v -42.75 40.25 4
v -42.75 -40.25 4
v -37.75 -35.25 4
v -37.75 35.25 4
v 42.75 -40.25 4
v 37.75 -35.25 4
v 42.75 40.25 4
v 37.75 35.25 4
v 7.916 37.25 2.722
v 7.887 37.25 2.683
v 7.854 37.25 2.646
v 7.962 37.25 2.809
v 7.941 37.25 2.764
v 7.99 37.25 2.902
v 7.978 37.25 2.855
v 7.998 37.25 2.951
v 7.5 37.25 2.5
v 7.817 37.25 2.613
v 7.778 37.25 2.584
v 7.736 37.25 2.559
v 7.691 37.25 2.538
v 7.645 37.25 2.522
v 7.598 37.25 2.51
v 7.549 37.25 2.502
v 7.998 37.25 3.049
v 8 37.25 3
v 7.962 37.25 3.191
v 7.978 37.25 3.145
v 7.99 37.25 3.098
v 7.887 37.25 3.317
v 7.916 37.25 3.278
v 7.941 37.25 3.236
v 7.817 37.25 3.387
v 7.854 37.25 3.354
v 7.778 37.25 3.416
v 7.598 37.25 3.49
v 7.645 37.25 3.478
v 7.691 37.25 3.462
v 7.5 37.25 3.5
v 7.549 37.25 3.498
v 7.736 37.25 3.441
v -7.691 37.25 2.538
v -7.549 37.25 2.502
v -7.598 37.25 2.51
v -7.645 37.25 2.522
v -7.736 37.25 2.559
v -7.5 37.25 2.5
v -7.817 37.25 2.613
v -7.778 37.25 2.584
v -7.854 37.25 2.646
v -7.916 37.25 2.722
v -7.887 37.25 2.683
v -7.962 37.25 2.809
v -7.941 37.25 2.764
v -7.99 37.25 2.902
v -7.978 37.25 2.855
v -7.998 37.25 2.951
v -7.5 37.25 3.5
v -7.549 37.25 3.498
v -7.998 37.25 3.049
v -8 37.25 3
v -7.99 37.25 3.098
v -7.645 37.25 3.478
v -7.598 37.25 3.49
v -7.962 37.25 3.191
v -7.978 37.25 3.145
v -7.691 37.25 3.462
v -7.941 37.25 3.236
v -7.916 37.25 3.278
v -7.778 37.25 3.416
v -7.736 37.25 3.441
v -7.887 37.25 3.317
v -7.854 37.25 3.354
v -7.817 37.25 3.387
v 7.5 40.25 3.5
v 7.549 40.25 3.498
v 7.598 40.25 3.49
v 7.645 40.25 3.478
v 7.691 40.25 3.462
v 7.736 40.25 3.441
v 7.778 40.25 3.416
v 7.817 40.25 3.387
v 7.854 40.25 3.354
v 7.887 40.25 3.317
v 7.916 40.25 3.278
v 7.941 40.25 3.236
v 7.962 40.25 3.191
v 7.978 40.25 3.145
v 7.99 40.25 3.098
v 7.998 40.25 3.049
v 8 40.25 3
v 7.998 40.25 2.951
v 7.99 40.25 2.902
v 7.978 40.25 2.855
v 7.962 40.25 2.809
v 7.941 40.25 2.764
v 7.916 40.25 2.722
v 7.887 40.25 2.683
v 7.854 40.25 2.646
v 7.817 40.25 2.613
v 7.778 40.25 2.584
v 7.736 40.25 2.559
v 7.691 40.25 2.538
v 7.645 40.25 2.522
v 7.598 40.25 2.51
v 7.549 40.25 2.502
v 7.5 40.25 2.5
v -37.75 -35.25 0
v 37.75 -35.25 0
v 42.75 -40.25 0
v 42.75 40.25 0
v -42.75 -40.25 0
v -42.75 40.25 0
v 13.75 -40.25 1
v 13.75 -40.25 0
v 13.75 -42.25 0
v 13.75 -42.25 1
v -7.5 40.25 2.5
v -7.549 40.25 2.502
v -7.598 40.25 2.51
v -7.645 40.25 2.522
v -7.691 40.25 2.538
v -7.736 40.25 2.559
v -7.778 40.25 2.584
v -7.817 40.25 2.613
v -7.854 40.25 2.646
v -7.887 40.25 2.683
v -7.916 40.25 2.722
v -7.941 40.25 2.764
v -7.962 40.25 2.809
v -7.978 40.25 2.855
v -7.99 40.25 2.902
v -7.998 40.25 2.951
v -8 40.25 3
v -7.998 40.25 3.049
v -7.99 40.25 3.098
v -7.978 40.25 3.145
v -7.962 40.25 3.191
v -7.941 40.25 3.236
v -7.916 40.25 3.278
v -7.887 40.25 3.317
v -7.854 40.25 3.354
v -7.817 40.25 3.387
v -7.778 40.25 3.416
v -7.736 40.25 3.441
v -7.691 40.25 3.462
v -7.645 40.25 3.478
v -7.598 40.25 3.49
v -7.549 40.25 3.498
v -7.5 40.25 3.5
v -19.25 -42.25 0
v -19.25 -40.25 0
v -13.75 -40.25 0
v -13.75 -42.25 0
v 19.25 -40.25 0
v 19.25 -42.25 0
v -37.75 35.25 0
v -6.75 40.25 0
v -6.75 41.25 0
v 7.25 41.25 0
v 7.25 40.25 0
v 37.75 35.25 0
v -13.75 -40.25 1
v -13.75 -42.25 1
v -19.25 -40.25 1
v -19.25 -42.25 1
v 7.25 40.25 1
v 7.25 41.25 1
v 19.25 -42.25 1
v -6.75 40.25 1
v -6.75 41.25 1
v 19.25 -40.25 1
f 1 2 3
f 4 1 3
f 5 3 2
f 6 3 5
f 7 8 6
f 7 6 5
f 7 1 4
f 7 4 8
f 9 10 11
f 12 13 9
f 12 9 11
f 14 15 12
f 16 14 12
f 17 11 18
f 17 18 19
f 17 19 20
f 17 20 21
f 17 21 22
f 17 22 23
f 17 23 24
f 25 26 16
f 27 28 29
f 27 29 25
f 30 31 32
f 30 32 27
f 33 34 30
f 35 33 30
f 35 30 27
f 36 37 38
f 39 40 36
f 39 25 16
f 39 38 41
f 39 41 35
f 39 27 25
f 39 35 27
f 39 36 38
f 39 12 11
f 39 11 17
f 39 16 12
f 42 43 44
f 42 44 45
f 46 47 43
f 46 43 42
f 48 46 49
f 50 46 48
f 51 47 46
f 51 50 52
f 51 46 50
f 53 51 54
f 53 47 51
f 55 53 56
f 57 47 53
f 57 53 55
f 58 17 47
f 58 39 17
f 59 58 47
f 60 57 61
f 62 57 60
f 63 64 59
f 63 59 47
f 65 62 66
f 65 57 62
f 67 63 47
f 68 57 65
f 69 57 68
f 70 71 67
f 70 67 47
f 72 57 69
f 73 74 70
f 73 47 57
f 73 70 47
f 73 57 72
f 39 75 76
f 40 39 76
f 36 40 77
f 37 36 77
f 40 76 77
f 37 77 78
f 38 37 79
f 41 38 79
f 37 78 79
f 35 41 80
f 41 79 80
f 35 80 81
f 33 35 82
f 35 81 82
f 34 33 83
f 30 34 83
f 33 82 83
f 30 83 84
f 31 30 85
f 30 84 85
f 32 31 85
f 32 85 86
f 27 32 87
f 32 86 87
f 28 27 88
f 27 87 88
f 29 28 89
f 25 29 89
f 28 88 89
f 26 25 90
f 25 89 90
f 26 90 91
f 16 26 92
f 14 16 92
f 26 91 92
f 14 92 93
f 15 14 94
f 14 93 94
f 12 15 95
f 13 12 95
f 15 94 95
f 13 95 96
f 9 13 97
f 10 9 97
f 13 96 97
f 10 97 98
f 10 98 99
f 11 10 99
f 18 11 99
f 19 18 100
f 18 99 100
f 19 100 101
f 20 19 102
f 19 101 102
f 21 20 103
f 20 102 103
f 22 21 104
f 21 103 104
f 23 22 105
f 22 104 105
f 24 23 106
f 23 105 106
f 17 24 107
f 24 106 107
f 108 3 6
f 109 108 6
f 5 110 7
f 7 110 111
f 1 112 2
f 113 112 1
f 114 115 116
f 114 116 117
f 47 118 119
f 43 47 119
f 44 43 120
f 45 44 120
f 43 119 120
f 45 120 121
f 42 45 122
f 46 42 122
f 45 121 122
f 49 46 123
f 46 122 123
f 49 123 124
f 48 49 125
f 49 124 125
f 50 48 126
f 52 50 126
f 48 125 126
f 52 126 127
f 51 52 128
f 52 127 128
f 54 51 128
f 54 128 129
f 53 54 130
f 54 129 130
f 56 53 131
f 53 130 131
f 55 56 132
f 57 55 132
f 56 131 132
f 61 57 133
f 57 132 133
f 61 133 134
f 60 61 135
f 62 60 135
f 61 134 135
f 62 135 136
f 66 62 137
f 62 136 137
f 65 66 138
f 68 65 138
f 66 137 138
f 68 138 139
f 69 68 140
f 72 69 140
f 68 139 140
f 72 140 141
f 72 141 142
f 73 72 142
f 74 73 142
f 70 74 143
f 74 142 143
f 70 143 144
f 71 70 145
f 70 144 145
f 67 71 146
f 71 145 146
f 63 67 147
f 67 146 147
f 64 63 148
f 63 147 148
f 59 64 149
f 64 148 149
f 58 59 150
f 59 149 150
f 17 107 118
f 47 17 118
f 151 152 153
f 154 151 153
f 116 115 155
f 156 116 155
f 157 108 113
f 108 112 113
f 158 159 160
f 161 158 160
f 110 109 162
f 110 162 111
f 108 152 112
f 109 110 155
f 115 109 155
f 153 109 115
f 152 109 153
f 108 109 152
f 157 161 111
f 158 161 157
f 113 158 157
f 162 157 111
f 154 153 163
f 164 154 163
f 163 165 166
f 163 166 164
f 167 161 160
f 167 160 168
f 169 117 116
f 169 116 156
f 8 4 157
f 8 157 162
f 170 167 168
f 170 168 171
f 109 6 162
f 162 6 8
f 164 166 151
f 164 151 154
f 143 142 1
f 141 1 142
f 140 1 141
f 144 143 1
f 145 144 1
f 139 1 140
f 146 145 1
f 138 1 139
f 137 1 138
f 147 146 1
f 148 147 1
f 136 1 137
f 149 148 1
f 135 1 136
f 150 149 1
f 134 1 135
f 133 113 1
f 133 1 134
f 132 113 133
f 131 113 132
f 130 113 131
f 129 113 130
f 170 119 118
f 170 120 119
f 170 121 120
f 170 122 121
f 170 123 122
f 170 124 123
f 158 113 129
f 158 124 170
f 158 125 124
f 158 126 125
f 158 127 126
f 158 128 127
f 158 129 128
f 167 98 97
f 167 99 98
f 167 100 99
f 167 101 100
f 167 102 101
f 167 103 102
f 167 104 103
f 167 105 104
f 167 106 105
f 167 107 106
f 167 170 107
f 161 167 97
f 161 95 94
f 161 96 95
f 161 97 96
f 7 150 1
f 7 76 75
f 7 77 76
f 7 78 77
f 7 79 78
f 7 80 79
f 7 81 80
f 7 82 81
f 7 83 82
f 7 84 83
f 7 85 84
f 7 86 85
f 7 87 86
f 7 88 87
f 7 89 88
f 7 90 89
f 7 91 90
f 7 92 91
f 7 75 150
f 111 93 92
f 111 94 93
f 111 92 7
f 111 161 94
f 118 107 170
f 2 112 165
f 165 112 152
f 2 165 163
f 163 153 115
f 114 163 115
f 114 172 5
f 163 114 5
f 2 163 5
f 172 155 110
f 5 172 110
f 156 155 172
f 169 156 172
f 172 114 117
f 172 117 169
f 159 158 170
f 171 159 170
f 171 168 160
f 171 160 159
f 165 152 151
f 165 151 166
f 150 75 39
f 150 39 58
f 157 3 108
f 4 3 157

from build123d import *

# Parameters (mm, degrees)
SKETCH006_W     = 85.5
SKETCH006_H     = 80.5
PAD_DEPTH       = 4
SKETCH007_W     = 75.5
SKETCH007_H     = 70.5
POCKET_DEPTH    = 4.001
SKETCH014_W     = 5.5
SKETCH014_H     = 1
PAD002_DEPTH    = 2
SKETCH016_W     = 14
SKETCH016_H     = 1
PAD003_DEPTH    = 1
POCKET001_DEPTH = 3


with BuildPart() as part:
    # Sketch006 → Pad (new body)
    with BuildSketch(Plane.XY):
        Rectangle(SKETCH006_W, SKETCH006_H)
    extrude(amount=PAD_DEPTH)

    # Sketch007 (on Face6 of Pad) → Pocket (cut, through all)
    with BuildSketch(Plane.XY.offset(4)):
        Rectangle(SKETCH007_W, SKETCH007_H)
    extrude(amount=-POCKET_DEPTH, mode=Mode.SUBTRACT)

    # Sketch014 (on Face6 of Pocket) → Pad002 (join)
    with BuildSketch(Plane.XZ.offset(40.25)):
        with Locations((-16.5, 0.5)):
            Rectangle(SKETCH014_W, SKETCH014_H)
        with Locations((16.5, 0.5)):
            Rectangle(SKETCH014_W, SKETCH014_H)
    extrude(amount=PAD002_DEPTH)

    # Sketch016 (on Face1 of Pad002) → Pad003 (join)
    with BuildSketch(Plane(origin=(0, 40.25, 0), x_dir=(-1, 0, 0), z_dir=(0, 1, 0))):
        with Locations((-0.25, 0.5)):
            Rectangle(SKETCH016_W, SKETCH016_H)
    extrude(amount=PAD003_DEPTH)

    # Sketch017 (on Face2 of Pad003) → Pocket001 (cut)
    with BuildSketch(Plane(origin=(0, 40.25, 0), x_dir=(-1, 0, 0), z_dir=(0, 1, 0))):
        with BuildLine():
            ThreePointArc((-7.5, 3.5), (-8, 3), (-7.5, 2.5))
            Line((-7.5, 2.5), (7.5, 2.5))
            ThreePointArc((7.5, 2.5), (8, 3), (7.5, 3.5))
            Line((-7.5, 3.5), (7.5, 3.5))
        make_face()
    extrude(amount=-POCKET001_DEPTH, mode=Mode.SUBTRACT)


solid = part.part
